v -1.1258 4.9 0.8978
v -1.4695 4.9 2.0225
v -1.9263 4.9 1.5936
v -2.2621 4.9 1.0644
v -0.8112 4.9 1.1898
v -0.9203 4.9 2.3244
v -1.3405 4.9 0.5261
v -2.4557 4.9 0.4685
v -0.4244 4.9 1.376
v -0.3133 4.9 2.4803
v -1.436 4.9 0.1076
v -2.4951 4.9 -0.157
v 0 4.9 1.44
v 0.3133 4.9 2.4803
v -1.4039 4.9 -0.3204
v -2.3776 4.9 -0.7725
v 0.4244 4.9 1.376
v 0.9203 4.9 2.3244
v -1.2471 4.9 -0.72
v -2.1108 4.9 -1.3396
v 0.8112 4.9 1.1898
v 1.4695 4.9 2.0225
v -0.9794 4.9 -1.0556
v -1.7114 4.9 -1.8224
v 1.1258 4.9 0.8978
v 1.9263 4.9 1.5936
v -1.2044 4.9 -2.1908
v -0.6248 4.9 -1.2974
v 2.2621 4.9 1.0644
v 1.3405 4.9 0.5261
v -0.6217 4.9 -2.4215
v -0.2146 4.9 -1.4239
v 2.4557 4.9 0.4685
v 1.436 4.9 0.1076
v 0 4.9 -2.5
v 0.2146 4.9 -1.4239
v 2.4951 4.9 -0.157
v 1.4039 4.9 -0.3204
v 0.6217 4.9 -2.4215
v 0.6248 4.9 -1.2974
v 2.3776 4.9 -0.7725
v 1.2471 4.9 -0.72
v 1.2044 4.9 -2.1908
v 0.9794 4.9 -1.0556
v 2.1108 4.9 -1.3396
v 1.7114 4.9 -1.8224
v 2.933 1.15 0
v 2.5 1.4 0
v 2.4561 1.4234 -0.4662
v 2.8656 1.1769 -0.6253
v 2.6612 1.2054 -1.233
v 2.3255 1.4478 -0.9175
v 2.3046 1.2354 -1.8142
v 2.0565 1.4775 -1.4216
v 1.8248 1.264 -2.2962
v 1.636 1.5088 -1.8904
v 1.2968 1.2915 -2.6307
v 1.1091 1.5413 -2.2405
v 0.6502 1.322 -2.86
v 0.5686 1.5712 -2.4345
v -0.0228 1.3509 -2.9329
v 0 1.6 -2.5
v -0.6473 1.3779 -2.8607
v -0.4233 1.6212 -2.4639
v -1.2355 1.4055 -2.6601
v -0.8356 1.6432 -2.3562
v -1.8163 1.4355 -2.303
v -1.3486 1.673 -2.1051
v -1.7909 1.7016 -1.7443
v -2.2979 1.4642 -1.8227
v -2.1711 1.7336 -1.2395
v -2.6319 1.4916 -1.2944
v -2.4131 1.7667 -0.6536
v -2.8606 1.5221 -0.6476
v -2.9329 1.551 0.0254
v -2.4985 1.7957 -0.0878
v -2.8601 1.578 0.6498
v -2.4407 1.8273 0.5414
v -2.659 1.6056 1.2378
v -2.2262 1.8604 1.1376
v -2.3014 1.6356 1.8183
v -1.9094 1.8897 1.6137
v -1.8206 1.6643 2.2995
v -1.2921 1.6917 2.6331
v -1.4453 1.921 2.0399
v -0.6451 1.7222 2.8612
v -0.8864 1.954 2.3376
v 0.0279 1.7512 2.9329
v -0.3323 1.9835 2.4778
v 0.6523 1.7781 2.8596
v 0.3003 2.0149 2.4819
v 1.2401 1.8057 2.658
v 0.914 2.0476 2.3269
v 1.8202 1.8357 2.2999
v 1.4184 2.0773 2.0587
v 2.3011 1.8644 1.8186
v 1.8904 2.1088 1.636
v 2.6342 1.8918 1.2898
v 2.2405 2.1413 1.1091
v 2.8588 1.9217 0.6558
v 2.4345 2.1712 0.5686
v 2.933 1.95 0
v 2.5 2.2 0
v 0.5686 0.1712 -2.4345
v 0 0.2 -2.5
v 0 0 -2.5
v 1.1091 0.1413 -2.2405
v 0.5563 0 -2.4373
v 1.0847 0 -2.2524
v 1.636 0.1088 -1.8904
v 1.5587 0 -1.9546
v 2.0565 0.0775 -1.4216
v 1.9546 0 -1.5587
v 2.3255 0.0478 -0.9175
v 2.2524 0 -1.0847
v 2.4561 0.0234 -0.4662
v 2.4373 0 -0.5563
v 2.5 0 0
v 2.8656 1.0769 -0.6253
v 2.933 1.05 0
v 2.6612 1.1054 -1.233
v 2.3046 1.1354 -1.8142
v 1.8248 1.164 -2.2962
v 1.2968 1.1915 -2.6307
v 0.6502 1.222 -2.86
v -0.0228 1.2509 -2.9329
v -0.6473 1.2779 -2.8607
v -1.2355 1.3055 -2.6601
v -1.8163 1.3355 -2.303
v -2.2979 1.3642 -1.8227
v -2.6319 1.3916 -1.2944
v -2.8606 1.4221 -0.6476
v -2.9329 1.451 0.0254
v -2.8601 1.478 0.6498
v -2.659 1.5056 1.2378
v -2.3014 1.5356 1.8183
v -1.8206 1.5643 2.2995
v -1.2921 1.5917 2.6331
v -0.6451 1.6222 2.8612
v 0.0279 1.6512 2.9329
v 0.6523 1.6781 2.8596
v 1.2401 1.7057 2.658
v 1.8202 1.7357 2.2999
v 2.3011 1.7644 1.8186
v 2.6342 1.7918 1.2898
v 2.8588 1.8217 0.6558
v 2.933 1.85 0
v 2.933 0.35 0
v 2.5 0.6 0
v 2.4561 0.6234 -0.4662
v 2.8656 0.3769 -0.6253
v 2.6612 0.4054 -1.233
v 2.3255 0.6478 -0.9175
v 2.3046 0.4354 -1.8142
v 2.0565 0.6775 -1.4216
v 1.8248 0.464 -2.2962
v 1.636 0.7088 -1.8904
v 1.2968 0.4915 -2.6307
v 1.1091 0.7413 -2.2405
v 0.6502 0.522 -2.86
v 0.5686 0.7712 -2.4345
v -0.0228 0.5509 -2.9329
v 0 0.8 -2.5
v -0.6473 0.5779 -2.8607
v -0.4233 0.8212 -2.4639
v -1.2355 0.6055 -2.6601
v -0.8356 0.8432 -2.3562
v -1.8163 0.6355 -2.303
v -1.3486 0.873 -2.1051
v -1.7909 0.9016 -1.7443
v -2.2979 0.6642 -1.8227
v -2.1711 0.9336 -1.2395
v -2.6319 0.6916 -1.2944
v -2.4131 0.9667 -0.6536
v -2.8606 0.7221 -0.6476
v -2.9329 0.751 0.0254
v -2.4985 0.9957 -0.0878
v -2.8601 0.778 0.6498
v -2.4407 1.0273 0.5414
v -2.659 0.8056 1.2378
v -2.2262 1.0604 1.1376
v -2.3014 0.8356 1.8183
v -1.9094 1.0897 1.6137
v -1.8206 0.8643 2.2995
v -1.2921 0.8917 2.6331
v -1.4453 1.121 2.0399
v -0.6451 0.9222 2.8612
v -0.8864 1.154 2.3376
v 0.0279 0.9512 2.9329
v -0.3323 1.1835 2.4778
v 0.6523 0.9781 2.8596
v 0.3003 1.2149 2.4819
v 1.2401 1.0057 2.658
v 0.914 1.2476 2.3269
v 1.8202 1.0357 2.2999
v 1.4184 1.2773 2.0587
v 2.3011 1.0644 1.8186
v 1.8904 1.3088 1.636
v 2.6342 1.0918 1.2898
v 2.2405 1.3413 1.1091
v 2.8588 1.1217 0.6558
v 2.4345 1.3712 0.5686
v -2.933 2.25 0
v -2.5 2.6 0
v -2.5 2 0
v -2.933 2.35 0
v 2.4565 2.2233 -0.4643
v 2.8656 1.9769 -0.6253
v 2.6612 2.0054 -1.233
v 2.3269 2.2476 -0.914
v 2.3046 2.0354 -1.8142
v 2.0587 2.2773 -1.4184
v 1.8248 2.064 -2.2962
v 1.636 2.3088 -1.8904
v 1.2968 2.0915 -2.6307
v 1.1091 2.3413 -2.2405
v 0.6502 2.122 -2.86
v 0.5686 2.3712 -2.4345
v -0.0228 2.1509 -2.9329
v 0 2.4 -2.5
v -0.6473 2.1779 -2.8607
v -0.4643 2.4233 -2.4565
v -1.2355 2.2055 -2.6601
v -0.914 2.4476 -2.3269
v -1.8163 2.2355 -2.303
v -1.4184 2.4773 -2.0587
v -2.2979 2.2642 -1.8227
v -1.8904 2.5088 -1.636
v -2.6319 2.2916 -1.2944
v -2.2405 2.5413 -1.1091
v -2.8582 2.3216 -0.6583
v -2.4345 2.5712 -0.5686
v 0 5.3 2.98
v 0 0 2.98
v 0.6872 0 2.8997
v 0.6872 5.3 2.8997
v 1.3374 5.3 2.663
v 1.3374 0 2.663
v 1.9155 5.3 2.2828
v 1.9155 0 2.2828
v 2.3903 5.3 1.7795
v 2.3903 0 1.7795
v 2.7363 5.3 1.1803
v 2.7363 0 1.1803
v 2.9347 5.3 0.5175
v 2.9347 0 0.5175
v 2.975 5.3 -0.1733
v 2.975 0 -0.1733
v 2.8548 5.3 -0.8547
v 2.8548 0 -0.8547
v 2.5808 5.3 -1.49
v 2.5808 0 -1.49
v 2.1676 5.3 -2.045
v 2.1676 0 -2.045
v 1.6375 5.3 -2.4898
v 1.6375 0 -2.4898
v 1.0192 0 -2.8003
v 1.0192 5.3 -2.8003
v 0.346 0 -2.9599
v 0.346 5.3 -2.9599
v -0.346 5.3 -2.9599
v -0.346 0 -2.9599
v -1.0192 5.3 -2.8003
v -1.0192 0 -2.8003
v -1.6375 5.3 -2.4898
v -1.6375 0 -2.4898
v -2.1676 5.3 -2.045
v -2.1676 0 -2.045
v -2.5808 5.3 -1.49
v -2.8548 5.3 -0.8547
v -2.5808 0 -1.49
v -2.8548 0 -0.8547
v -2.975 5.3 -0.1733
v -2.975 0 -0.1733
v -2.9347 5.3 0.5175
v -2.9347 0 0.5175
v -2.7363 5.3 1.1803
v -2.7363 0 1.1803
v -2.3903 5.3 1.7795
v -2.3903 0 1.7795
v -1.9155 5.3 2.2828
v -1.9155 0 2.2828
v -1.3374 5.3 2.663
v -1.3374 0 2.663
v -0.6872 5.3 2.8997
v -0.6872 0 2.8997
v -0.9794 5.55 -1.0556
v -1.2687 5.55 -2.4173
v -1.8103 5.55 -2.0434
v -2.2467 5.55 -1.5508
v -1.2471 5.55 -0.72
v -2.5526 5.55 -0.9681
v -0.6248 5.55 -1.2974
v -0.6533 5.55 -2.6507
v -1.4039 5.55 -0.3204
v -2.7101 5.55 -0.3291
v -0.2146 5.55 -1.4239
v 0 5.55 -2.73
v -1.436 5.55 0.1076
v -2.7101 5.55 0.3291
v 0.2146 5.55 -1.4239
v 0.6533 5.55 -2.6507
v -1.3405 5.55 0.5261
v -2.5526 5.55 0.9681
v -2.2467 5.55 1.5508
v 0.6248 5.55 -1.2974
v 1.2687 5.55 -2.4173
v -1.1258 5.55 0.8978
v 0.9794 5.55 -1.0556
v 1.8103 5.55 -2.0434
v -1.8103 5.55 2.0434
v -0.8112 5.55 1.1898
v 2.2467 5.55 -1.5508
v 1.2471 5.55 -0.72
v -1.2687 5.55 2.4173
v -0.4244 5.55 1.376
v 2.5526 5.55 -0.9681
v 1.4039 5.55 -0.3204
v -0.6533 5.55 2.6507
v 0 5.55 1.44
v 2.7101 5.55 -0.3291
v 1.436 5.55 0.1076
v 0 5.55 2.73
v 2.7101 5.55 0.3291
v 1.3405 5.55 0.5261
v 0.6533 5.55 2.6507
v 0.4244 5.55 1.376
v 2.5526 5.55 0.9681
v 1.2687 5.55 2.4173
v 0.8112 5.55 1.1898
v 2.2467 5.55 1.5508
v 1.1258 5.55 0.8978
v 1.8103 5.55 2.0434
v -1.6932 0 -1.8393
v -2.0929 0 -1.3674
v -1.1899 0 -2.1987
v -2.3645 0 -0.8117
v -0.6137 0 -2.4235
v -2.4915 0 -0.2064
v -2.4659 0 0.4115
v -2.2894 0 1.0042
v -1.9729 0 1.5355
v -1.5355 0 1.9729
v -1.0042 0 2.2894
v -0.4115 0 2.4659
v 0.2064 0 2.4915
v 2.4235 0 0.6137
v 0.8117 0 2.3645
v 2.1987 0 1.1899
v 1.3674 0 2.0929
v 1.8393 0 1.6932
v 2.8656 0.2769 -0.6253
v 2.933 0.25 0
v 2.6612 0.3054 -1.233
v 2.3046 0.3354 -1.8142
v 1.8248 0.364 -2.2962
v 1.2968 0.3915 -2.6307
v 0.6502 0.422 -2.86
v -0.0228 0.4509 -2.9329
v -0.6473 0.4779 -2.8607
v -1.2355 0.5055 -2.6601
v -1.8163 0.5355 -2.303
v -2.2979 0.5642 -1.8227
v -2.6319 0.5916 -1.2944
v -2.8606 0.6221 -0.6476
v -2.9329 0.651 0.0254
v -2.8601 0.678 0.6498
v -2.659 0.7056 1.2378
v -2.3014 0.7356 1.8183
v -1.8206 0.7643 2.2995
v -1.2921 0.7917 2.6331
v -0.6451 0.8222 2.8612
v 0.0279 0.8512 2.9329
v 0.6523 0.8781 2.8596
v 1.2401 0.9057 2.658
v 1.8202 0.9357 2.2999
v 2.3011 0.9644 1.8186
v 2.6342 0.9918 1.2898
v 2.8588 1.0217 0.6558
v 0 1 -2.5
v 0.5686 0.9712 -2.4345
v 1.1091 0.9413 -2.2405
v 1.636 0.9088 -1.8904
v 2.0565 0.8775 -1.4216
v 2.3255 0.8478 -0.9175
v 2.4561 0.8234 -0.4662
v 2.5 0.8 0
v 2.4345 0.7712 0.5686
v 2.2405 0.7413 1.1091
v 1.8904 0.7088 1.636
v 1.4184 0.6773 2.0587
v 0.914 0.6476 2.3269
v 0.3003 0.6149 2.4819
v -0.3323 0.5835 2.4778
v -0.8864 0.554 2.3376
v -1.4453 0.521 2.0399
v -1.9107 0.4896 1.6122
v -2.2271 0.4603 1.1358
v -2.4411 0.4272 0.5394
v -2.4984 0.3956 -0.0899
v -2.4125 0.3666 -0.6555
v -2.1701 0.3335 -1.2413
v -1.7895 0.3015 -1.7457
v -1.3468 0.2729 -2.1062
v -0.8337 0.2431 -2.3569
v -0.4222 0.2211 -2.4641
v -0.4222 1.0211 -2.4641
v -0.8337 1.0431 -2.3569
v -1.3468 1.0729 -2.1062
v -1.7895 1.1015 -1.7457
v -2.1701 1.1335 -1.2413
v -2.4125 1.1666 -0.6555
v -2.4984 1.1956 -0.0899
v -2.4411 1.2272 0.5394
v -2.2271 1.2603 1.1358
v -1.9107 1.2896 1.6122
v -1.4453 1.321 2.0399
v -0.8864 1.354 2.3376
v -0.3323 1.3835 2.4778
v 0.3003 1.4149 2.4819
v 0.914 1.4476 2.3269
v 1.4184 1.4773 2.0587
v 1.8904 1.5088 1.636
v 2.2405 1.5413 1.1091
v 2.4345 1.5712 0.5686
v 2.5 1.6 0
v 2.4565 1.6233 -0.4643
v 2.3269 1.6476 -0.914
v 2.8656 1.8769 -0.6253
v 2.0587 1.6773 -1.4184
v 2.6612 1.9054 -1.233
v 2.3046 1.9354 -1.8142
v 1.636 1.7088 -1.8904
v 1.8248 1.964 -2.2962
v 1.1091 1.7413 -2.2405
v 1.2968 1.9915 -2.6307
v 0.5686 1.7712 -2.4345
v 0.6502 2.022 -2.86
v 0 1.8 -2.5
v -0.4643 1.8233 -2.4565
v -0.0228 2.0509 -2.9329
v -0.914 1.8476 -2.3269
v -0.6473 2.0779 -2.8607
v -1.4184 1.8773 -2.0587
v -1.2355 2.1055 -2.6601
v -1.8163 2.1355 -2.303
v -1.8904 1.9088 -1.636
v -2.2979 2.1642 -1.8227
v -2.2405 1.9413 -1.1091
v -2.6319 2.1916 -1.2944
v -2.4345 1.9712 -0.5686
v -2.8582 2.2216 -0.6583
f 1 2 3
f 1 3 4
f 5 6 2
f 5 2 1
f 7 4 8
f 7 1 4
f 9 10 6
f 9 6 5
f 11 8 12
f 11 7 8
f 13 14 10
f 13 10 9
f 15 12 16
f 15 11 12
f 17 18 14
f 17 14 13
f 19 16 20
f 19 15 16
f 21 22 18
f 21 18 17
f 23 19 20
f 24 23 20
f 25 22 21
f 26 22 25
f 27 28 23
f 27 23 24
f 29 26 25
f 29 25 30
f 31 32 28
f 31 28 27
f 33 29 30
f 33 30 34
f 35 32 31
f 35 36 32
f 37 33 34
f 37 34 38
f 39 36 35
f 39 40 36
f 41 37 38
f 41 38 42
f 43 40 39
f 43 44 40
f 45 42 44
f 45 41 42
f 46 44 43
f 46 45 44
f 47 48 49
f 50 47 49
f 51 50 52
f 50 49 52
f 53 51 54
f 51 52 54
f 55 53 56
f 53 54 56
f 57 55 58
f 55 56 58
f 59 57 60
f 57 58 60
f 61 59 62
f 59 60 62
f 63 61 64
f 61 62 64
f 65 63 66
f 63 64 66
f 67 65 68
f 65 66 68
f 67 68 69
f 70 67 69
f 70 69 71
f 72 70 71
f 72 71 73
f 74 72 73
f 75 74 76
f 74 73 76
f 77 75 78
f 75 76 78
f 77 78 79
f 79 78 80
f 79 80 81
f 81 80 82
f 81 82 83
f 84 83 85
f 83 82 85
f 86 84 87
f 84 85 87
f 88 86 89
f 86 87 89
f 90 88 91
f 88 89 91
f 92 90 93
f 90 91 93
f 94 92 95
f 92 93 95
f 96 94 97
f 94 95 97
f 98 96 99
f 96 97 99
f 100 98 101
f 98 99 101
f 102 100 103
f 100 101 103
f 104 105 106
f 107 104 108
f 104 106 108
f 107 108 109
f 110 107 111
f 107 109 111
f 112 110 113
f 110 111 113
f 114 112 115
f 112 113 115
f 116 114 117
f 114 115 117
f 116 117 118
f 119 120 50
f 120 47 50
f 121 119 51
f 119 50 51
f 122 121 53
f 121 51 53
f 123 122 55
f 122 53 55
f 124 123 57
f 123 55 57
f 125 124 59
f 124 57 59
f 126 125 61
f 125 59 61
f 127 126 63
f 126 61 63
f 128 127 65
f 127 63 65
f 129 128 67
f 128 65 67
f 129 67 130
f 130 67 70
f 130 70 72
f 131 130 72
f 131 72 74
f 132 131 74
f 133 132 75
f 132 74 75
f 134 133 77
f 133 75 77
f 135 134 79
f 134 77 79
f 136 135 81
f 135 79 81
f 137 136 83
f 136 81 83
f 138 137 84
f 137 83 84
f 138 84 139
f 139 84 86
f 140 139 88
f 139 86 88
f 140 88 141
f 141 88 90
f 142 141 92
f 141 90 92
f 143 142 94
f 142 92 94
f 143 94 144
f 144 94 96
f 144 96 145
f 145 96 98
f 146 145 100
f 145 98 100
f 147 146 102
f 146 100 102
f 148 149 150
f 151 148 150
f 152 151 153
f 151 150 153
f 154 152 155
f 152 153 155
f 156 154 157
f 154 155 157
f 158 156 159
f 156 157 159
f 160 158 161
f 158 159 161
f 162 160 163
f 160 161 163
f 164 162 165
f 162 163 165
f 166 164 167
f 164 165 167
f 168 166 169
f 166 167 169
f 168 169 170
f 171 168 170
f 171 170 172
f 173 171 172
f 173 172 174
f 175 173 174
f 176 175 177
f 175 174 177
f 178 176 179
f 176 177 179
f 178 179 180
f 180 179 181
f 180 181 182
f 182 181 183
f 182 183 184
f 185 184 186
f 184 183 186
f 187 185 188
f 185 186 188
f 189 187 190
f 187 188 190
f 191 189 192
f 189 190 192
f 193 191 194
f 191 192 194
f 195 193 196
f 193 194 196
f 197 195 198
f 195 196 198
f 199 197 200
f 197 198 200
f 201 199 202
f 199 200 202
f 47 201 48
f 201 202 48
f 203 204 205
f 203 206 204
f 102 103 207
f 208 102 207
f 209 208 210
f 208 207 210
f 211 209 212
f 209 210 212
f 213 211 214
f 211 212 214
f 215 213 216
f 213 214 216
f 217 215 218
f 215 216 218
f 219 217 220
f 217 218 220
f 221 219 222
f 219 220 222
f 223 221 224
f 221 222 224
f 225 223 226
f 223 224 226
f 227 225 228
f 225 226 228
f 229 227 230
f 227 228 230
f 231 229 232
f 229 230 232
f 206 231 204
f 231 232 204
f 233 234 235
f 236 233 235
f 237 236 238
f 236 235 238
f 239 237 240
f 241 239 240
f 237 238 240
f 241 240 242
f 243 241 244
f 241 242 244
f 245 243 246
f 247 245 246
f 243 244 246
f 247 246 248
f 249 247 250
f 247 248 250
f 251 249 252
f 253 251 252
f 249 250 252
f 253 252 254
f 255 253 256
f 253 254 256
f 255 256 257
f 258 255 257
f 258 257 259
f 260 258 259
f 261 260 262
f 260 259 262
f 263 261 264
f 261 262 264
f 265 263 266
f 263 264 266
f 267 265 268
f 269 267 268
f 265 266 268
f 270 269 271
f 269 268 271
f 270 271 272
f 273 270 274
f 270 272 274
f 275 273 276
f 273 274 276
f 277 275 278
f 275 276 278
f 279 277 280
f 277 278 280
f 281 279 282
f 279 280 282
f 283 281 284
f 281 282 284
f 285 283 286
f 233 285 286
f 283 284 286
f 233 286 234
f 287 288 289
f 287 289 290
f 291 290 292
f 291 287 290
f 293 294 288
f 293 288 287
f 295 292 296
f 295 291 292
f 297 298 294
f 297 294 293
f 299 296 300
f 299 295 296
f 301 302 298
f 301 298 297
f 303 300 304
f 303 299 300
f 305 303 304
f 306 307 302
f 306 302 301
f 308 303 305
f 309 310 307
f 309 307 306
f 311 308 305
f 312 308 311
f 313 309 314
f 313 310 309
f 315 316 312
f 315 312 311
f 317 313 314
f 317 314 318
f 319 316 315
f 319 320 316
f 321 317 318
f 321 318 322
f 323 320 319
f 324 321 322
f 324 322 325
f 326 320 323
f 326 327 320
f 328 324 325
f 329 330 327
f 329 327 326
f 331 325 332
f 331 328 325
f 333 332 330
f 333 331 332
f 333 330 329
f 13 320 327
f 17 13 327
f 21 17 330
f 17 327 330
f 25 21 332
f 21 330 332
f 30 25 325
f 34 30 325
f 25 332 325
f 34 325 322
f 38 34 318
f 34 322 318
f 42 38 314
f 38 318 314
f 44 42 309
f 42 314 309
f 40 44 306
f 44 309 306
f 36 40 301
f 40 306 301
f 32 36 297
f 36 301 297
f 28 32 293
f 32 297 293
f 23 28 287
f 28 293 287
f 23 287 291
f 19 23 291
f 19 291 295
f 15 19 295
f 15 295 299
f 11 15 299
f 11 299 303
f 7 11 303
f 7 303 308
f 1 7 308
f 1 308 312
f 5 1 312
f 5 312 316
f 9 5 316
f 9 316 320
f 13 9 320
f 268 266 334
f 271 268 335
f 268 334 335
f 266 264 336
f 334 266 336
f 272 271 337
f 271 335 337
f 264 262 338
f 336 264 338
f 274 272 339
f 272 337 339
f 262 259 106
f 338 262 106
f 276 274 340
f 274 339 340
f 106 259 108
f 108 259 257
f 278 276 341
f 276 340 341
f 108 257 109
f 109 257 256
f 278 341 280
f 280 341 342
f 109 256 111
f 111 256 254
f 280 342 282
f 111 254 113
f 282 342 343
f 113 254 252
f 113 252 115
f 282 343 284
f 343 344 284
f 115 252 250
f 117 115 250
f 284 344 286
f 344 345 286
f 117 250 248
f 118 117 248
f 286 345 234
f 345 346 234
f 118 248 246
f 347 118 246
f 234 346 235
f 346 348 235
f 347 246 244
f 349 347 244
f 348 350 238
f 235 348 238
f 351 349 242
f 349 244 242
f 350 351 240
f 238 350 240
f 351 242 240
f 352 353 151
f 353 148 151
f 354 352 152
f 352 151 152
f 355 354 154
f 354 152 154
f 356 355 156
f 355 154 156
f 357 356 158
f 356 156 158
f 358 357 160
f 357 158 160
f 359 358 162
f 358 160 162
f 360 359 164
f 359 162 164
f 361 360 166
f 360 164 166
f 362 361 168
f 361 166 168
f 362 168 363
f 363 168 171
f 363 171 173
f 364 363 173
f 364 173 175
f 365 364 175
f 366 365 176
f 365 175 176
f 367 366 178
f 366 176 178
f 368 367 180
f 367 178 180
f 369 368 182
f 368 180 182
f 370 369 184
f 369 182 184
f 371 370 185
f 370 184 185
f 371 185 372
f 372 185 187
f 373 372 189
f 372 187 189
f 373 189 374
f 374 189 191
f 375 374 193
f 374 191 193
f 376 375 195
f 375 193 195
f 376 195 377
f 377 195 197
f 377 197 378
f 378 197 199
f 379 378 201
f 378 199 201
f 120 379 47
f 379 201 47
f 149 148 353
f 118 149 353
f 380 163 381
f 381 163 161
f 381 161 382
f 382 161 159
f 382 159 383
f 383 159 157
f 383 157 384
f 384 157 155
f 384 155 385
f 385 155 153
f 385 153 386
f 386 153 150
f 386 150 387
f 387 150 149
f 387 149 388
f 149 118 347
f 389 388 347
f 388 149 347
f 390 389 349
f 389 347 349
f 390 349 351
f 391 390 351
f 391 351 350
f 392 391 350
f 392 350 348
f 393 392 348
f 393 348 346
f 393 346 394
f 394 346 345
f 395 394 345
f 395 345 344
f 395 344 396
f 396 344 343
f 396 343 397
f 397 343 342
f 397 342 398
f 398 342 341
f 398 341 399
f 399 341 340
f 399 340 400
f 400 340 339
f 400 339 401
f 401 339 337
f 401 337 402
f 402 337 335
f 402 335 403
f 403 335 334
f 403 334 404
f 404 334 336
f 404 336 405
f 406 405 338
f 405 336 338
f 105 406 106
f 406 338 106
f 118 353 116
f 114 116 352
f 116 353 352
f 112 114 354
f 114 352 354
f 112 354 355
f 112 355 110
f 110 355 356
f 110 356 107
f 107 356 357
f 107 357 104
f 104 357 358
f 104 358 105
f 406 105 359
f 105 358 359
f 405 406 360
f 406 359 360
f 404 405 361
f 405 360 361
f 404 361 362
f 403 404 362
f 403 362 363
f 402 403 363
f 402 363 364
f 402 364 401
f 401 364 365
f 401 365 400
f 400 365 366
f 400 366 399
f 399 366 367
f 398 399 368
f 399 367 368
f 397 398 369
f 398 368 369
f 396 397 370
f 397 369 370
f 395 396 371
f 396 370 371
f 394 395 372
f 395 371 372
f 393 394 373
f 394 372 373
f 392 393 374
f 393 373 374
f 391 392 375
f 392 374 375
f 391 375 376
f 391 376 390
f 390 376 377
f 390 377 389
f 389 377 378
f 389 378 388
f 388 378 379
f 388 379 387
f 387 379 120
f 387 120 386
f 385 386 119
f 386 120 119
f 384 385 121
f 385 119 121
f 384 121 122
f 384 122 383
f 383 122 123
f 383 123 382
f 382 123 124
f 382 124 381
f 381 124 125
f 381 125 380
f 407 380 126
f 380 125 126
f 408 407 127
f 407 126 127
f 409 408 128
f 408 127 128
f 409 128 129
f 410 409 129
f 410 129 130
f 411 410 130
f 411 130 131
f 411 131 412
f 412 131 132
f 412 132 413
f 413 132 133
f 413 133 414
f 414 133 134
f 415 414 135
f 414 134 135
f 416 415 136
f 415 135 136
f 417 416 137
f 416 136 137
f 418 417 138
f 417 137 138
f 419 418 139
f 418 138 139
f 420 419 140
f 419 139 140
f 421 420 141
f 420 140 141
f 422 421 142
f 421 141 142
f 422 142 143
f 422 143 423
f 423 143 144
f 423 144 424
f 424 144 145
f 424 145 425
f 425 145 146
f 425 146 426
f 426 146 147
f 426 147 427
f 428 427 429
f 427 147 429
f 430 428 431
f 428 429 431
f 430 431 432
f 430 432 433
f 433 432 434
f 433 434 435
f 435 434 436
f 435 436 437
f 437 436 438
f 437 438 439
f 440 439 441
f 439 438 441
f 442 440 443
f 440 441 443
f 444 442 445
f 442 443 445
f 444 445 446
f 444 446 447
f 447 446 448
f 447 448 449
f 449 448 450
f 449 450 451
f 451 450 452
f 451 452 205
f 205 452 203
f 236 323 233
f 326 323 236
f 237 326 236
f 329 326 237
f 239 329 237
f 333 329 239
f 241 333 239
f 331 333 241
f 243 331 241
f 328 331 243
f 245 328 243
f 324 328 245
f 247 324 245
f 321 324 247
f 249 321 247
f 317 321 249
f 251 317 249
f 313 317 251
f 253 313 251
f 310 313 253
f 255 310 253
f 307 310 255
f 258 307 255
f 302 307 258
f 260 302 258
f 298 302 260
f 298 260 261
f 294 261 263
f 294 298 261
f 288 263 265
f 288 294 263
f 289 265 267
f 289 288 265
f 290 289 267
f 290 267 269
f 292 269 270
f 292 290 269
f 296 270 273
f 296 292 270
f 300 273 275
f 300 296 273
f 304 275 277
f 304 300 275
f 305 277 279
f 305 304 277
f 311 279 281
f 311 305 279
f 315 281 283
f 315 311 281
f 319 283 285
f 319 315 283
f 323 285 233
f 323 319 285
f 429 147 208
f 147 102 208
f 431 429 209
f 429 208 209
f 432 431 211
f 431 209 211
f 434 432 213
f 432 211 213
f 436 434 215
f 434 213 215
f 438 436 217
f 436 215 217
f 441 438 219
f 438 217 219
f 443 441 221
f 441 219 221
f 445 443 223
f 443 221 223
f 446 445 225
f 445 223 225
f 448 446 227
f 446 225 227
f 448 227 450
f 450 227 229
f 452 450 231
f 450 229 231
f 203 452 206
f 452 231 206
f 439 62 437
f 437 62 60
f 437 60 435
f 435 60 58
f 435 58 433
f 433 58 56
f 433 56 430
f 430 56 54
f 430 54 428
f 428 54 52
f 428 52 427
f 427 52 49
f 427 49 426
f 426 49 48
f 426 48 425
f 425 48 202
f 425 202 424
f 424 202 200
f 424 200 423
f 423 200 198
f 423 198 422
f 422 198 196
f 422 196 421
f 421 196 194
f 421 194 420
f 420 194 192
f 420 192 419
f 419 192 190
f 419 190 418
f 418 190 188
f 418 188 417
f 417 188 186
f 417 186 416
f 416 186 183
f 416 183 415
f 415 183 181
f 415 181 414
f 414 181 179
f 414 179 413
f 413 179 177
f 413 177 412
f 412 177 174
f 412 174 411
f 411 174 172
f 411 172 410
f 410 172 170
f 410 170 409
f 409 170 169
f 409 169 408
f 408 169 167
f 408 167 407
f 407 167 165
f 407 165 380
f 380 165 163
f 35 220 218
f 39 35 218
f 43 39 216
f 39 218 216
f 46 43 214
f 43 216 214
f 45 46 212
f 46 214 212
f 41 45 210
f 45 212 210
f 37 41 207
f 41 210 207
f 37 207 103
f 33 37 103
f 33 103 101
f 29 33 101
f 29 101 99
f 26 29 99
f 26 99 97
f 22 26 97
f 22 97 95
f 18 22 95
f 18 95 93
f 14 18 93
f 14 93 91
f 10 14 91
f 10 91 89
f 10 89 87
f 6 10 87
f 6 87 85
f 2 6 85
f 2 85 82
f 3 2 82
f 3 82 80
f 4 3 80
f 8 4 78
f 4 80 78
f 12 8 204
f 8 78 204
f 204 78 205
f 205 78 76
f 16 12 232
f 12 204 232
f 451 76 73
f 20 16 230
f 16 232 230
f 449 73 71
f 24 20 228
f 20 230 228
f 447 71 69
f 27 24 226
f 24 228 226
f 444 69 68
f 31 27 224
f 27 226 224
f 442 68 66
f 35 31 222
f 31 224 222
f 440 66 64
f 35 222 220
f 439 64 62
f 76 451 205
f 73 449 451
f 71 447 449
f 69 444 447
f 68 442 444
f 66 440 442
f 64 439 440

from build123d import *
from build123d.topology import SkipClean

# Parameters (mm, degrees)
SKETCH1_R           = 2.98
BOSS_EXTRUDE1_DEPTH = 5.55
SKETCH2_R           = 2.5
CUT_EXTRUDE1_DEPTH  = 4.9
SKETCH3_R           = 1.44
CUT_EXTRUDE2_DEPTH  = 7.968737332
CHAMFER1_SIZE       = 0.25
THREAD1_PITCH       = 0.8


with BuildPart() as part:
    # Sketch1 → Boss-Extrude1 (new body)
    with BuildSketch(Plane(origin=(0, 0, 0), x_dir=(1, 0, 0), z_dir=(0, 1, 0))):
        with Locations(Location((0, 0, 0), (0, 0, 270))):
            Circle(SKETCH1_R)
    extrude(amount=BOSS_EXTRUDE1_DEPTH)

    # Sketch2 → Cut-Extrude1 (cut)
    with BuildSketch(Plane.XZ):
        with Locations(Location((0, 0, 0), (0, 0, 270))):
            Circle(SKETCH2_R)
    extrude(amount=-CUT_EXTRUDE1_DEPTH, mode=Mode.SUBTRACT)

    # Sketch3 → Cut-Extrude2 (cut, through all)
    with BuildSketch(Plane(origin=(0, 5.55, 0), x_dir=(1, 0, 0), z_dir=(0, 1, 0))):
        with Locations(Location((0, 0, 0), (0, 0, 270))):
            Circle(SKETCH3_R)
    extrude(amount=-CUT_EXTRUDE2_DEPTH, mode=Mode.SUBTRACT)

    # Chamfer1
    chamfer1_edges = [part.edges().sort_by_distance(p)[0] for p in [
        (0, 5.55, -2.98),
    ]]
    chamfer(chamfer1_edges, length=CHAMFER1_SIZE)

    # Thread1: the profile of Thread Profile1 profile screwed along a right-hand helix of 2.5 turns, 8 arcs to a turn; built about Z, then put on its axis
    with SkipClean():  # the faces are left unmerged after this step: merging them gives an invalid solid
        thread1_z = Axis((0, 0, 0), (0, 0, 1))
        thread1_corners = [(2.4997, 0, -0.000173205), (2.9330127, 0, 0.249999999), (2.9330127, 0, 0.349999999), (2.4997, 0, 0.600173203)]
        with BuildLine(mode=Mode.PRIVATE) as thread1_profile:
            Line(thread1_corners[0], thread1_corners[1])
            Line(thread1_corners[1], thread1_corners[2])
            Line(thread1_corners[2], thread1_corners[3])
            Line(thread1_corners[3], thread1_corners[0])
        thread1_cap = Face(thread1_profile.wire())
        thread1_turn_angles = [0, 22.5, 45, 67.5, 90, 112.5, 135, 157.5, 180, 202.5, 225, 247.5, 270, 292.5, 315, 337.5, 360]
        thread1_turn_weights = [1, 0.9238795325112867, 1, 0.9238795325112867, 1, 0.9238795325112867, 1, 0.9238795325112867, 1, 0.9238795325112867, 1, 0.9238795325112867, 1, 0.9238795325112867, 1, 0.9238795325112867, 1]
        thread1_turn_rails = [Edge.make_bspline([Vector(p[0], p[1], 0).rotate(thread1_z, thread1_turn_angles[k]) / thread1_turn_weights[k] + Vector(0, 0, p[2] + THREAD1_PITCH * thread1_turn_angles[k] / 360) for k in range(17)], [0, 0, 0, 1, 1, 2, 2, 3, 3, 4, 4, 5, 5, 6, 6, 7, 7, 8, 8, 8], 2, thread1_turn_weights) for p in thread1_corners]
        thread1_turn_sides = [Face.make_surface_from_curves(thread1_turn_rails[p[0]], thread1_turn_rails[p[1]]) for p in [(0, 1), (1, 2), (2, 3), (3, 0)]]
        thread1_last_angles = [720, 742.5, 765, 787.5, 810, 832.5, 855, 877.5, 900]
        thread1_last_weights = [1, 0.9238795325112867, 1, 0.9238795325112867, 1, 0.9238795325112867, 1, 0.9238795325112867, 1]
        thread1_last_rails = [Edge.make_bspline([Vector(p[0], p[1], 0).rotate(thread1_z, thread1_last_angles[k]) / thread1_last_weights[k] + Vector(0, 0, p[2] + THREAD1_PITCH * thread1_last_angles[k] / 360) for k in range(9)], [0, 0, 0, 1, 1, 2, 2, 3, 3, 4, 4, 4], 2, thread1_last_weights) for p in thread1_corners]
        thread1_last_sides = [Face.make_surface_from_curves(thread1_last_rails[p[0]], thread1_last_rails[p[1]]) for p in [(0, 1), (1, 2), (2, 3), (3, 0)]]
        thread1 = Plane(origin=(0, 0, 0), x_dir=(1, 0, 0), z_dir=(0, 1, 0)) * Solid(Shell([*[p.moved(Location((0, 0, THREAD1_PITCH * i))) for i in range(2) for p in thread1_turn_sides], *thread1_last_sides, thread1_cap, thread1_cap.rotate(thread1_z, 900).moved(Location((0, 0, THREAD1_PITCH * 900 / 360)))]))
        add(thread1, mode=Mode.SUBTRACT)


solid = part.part
